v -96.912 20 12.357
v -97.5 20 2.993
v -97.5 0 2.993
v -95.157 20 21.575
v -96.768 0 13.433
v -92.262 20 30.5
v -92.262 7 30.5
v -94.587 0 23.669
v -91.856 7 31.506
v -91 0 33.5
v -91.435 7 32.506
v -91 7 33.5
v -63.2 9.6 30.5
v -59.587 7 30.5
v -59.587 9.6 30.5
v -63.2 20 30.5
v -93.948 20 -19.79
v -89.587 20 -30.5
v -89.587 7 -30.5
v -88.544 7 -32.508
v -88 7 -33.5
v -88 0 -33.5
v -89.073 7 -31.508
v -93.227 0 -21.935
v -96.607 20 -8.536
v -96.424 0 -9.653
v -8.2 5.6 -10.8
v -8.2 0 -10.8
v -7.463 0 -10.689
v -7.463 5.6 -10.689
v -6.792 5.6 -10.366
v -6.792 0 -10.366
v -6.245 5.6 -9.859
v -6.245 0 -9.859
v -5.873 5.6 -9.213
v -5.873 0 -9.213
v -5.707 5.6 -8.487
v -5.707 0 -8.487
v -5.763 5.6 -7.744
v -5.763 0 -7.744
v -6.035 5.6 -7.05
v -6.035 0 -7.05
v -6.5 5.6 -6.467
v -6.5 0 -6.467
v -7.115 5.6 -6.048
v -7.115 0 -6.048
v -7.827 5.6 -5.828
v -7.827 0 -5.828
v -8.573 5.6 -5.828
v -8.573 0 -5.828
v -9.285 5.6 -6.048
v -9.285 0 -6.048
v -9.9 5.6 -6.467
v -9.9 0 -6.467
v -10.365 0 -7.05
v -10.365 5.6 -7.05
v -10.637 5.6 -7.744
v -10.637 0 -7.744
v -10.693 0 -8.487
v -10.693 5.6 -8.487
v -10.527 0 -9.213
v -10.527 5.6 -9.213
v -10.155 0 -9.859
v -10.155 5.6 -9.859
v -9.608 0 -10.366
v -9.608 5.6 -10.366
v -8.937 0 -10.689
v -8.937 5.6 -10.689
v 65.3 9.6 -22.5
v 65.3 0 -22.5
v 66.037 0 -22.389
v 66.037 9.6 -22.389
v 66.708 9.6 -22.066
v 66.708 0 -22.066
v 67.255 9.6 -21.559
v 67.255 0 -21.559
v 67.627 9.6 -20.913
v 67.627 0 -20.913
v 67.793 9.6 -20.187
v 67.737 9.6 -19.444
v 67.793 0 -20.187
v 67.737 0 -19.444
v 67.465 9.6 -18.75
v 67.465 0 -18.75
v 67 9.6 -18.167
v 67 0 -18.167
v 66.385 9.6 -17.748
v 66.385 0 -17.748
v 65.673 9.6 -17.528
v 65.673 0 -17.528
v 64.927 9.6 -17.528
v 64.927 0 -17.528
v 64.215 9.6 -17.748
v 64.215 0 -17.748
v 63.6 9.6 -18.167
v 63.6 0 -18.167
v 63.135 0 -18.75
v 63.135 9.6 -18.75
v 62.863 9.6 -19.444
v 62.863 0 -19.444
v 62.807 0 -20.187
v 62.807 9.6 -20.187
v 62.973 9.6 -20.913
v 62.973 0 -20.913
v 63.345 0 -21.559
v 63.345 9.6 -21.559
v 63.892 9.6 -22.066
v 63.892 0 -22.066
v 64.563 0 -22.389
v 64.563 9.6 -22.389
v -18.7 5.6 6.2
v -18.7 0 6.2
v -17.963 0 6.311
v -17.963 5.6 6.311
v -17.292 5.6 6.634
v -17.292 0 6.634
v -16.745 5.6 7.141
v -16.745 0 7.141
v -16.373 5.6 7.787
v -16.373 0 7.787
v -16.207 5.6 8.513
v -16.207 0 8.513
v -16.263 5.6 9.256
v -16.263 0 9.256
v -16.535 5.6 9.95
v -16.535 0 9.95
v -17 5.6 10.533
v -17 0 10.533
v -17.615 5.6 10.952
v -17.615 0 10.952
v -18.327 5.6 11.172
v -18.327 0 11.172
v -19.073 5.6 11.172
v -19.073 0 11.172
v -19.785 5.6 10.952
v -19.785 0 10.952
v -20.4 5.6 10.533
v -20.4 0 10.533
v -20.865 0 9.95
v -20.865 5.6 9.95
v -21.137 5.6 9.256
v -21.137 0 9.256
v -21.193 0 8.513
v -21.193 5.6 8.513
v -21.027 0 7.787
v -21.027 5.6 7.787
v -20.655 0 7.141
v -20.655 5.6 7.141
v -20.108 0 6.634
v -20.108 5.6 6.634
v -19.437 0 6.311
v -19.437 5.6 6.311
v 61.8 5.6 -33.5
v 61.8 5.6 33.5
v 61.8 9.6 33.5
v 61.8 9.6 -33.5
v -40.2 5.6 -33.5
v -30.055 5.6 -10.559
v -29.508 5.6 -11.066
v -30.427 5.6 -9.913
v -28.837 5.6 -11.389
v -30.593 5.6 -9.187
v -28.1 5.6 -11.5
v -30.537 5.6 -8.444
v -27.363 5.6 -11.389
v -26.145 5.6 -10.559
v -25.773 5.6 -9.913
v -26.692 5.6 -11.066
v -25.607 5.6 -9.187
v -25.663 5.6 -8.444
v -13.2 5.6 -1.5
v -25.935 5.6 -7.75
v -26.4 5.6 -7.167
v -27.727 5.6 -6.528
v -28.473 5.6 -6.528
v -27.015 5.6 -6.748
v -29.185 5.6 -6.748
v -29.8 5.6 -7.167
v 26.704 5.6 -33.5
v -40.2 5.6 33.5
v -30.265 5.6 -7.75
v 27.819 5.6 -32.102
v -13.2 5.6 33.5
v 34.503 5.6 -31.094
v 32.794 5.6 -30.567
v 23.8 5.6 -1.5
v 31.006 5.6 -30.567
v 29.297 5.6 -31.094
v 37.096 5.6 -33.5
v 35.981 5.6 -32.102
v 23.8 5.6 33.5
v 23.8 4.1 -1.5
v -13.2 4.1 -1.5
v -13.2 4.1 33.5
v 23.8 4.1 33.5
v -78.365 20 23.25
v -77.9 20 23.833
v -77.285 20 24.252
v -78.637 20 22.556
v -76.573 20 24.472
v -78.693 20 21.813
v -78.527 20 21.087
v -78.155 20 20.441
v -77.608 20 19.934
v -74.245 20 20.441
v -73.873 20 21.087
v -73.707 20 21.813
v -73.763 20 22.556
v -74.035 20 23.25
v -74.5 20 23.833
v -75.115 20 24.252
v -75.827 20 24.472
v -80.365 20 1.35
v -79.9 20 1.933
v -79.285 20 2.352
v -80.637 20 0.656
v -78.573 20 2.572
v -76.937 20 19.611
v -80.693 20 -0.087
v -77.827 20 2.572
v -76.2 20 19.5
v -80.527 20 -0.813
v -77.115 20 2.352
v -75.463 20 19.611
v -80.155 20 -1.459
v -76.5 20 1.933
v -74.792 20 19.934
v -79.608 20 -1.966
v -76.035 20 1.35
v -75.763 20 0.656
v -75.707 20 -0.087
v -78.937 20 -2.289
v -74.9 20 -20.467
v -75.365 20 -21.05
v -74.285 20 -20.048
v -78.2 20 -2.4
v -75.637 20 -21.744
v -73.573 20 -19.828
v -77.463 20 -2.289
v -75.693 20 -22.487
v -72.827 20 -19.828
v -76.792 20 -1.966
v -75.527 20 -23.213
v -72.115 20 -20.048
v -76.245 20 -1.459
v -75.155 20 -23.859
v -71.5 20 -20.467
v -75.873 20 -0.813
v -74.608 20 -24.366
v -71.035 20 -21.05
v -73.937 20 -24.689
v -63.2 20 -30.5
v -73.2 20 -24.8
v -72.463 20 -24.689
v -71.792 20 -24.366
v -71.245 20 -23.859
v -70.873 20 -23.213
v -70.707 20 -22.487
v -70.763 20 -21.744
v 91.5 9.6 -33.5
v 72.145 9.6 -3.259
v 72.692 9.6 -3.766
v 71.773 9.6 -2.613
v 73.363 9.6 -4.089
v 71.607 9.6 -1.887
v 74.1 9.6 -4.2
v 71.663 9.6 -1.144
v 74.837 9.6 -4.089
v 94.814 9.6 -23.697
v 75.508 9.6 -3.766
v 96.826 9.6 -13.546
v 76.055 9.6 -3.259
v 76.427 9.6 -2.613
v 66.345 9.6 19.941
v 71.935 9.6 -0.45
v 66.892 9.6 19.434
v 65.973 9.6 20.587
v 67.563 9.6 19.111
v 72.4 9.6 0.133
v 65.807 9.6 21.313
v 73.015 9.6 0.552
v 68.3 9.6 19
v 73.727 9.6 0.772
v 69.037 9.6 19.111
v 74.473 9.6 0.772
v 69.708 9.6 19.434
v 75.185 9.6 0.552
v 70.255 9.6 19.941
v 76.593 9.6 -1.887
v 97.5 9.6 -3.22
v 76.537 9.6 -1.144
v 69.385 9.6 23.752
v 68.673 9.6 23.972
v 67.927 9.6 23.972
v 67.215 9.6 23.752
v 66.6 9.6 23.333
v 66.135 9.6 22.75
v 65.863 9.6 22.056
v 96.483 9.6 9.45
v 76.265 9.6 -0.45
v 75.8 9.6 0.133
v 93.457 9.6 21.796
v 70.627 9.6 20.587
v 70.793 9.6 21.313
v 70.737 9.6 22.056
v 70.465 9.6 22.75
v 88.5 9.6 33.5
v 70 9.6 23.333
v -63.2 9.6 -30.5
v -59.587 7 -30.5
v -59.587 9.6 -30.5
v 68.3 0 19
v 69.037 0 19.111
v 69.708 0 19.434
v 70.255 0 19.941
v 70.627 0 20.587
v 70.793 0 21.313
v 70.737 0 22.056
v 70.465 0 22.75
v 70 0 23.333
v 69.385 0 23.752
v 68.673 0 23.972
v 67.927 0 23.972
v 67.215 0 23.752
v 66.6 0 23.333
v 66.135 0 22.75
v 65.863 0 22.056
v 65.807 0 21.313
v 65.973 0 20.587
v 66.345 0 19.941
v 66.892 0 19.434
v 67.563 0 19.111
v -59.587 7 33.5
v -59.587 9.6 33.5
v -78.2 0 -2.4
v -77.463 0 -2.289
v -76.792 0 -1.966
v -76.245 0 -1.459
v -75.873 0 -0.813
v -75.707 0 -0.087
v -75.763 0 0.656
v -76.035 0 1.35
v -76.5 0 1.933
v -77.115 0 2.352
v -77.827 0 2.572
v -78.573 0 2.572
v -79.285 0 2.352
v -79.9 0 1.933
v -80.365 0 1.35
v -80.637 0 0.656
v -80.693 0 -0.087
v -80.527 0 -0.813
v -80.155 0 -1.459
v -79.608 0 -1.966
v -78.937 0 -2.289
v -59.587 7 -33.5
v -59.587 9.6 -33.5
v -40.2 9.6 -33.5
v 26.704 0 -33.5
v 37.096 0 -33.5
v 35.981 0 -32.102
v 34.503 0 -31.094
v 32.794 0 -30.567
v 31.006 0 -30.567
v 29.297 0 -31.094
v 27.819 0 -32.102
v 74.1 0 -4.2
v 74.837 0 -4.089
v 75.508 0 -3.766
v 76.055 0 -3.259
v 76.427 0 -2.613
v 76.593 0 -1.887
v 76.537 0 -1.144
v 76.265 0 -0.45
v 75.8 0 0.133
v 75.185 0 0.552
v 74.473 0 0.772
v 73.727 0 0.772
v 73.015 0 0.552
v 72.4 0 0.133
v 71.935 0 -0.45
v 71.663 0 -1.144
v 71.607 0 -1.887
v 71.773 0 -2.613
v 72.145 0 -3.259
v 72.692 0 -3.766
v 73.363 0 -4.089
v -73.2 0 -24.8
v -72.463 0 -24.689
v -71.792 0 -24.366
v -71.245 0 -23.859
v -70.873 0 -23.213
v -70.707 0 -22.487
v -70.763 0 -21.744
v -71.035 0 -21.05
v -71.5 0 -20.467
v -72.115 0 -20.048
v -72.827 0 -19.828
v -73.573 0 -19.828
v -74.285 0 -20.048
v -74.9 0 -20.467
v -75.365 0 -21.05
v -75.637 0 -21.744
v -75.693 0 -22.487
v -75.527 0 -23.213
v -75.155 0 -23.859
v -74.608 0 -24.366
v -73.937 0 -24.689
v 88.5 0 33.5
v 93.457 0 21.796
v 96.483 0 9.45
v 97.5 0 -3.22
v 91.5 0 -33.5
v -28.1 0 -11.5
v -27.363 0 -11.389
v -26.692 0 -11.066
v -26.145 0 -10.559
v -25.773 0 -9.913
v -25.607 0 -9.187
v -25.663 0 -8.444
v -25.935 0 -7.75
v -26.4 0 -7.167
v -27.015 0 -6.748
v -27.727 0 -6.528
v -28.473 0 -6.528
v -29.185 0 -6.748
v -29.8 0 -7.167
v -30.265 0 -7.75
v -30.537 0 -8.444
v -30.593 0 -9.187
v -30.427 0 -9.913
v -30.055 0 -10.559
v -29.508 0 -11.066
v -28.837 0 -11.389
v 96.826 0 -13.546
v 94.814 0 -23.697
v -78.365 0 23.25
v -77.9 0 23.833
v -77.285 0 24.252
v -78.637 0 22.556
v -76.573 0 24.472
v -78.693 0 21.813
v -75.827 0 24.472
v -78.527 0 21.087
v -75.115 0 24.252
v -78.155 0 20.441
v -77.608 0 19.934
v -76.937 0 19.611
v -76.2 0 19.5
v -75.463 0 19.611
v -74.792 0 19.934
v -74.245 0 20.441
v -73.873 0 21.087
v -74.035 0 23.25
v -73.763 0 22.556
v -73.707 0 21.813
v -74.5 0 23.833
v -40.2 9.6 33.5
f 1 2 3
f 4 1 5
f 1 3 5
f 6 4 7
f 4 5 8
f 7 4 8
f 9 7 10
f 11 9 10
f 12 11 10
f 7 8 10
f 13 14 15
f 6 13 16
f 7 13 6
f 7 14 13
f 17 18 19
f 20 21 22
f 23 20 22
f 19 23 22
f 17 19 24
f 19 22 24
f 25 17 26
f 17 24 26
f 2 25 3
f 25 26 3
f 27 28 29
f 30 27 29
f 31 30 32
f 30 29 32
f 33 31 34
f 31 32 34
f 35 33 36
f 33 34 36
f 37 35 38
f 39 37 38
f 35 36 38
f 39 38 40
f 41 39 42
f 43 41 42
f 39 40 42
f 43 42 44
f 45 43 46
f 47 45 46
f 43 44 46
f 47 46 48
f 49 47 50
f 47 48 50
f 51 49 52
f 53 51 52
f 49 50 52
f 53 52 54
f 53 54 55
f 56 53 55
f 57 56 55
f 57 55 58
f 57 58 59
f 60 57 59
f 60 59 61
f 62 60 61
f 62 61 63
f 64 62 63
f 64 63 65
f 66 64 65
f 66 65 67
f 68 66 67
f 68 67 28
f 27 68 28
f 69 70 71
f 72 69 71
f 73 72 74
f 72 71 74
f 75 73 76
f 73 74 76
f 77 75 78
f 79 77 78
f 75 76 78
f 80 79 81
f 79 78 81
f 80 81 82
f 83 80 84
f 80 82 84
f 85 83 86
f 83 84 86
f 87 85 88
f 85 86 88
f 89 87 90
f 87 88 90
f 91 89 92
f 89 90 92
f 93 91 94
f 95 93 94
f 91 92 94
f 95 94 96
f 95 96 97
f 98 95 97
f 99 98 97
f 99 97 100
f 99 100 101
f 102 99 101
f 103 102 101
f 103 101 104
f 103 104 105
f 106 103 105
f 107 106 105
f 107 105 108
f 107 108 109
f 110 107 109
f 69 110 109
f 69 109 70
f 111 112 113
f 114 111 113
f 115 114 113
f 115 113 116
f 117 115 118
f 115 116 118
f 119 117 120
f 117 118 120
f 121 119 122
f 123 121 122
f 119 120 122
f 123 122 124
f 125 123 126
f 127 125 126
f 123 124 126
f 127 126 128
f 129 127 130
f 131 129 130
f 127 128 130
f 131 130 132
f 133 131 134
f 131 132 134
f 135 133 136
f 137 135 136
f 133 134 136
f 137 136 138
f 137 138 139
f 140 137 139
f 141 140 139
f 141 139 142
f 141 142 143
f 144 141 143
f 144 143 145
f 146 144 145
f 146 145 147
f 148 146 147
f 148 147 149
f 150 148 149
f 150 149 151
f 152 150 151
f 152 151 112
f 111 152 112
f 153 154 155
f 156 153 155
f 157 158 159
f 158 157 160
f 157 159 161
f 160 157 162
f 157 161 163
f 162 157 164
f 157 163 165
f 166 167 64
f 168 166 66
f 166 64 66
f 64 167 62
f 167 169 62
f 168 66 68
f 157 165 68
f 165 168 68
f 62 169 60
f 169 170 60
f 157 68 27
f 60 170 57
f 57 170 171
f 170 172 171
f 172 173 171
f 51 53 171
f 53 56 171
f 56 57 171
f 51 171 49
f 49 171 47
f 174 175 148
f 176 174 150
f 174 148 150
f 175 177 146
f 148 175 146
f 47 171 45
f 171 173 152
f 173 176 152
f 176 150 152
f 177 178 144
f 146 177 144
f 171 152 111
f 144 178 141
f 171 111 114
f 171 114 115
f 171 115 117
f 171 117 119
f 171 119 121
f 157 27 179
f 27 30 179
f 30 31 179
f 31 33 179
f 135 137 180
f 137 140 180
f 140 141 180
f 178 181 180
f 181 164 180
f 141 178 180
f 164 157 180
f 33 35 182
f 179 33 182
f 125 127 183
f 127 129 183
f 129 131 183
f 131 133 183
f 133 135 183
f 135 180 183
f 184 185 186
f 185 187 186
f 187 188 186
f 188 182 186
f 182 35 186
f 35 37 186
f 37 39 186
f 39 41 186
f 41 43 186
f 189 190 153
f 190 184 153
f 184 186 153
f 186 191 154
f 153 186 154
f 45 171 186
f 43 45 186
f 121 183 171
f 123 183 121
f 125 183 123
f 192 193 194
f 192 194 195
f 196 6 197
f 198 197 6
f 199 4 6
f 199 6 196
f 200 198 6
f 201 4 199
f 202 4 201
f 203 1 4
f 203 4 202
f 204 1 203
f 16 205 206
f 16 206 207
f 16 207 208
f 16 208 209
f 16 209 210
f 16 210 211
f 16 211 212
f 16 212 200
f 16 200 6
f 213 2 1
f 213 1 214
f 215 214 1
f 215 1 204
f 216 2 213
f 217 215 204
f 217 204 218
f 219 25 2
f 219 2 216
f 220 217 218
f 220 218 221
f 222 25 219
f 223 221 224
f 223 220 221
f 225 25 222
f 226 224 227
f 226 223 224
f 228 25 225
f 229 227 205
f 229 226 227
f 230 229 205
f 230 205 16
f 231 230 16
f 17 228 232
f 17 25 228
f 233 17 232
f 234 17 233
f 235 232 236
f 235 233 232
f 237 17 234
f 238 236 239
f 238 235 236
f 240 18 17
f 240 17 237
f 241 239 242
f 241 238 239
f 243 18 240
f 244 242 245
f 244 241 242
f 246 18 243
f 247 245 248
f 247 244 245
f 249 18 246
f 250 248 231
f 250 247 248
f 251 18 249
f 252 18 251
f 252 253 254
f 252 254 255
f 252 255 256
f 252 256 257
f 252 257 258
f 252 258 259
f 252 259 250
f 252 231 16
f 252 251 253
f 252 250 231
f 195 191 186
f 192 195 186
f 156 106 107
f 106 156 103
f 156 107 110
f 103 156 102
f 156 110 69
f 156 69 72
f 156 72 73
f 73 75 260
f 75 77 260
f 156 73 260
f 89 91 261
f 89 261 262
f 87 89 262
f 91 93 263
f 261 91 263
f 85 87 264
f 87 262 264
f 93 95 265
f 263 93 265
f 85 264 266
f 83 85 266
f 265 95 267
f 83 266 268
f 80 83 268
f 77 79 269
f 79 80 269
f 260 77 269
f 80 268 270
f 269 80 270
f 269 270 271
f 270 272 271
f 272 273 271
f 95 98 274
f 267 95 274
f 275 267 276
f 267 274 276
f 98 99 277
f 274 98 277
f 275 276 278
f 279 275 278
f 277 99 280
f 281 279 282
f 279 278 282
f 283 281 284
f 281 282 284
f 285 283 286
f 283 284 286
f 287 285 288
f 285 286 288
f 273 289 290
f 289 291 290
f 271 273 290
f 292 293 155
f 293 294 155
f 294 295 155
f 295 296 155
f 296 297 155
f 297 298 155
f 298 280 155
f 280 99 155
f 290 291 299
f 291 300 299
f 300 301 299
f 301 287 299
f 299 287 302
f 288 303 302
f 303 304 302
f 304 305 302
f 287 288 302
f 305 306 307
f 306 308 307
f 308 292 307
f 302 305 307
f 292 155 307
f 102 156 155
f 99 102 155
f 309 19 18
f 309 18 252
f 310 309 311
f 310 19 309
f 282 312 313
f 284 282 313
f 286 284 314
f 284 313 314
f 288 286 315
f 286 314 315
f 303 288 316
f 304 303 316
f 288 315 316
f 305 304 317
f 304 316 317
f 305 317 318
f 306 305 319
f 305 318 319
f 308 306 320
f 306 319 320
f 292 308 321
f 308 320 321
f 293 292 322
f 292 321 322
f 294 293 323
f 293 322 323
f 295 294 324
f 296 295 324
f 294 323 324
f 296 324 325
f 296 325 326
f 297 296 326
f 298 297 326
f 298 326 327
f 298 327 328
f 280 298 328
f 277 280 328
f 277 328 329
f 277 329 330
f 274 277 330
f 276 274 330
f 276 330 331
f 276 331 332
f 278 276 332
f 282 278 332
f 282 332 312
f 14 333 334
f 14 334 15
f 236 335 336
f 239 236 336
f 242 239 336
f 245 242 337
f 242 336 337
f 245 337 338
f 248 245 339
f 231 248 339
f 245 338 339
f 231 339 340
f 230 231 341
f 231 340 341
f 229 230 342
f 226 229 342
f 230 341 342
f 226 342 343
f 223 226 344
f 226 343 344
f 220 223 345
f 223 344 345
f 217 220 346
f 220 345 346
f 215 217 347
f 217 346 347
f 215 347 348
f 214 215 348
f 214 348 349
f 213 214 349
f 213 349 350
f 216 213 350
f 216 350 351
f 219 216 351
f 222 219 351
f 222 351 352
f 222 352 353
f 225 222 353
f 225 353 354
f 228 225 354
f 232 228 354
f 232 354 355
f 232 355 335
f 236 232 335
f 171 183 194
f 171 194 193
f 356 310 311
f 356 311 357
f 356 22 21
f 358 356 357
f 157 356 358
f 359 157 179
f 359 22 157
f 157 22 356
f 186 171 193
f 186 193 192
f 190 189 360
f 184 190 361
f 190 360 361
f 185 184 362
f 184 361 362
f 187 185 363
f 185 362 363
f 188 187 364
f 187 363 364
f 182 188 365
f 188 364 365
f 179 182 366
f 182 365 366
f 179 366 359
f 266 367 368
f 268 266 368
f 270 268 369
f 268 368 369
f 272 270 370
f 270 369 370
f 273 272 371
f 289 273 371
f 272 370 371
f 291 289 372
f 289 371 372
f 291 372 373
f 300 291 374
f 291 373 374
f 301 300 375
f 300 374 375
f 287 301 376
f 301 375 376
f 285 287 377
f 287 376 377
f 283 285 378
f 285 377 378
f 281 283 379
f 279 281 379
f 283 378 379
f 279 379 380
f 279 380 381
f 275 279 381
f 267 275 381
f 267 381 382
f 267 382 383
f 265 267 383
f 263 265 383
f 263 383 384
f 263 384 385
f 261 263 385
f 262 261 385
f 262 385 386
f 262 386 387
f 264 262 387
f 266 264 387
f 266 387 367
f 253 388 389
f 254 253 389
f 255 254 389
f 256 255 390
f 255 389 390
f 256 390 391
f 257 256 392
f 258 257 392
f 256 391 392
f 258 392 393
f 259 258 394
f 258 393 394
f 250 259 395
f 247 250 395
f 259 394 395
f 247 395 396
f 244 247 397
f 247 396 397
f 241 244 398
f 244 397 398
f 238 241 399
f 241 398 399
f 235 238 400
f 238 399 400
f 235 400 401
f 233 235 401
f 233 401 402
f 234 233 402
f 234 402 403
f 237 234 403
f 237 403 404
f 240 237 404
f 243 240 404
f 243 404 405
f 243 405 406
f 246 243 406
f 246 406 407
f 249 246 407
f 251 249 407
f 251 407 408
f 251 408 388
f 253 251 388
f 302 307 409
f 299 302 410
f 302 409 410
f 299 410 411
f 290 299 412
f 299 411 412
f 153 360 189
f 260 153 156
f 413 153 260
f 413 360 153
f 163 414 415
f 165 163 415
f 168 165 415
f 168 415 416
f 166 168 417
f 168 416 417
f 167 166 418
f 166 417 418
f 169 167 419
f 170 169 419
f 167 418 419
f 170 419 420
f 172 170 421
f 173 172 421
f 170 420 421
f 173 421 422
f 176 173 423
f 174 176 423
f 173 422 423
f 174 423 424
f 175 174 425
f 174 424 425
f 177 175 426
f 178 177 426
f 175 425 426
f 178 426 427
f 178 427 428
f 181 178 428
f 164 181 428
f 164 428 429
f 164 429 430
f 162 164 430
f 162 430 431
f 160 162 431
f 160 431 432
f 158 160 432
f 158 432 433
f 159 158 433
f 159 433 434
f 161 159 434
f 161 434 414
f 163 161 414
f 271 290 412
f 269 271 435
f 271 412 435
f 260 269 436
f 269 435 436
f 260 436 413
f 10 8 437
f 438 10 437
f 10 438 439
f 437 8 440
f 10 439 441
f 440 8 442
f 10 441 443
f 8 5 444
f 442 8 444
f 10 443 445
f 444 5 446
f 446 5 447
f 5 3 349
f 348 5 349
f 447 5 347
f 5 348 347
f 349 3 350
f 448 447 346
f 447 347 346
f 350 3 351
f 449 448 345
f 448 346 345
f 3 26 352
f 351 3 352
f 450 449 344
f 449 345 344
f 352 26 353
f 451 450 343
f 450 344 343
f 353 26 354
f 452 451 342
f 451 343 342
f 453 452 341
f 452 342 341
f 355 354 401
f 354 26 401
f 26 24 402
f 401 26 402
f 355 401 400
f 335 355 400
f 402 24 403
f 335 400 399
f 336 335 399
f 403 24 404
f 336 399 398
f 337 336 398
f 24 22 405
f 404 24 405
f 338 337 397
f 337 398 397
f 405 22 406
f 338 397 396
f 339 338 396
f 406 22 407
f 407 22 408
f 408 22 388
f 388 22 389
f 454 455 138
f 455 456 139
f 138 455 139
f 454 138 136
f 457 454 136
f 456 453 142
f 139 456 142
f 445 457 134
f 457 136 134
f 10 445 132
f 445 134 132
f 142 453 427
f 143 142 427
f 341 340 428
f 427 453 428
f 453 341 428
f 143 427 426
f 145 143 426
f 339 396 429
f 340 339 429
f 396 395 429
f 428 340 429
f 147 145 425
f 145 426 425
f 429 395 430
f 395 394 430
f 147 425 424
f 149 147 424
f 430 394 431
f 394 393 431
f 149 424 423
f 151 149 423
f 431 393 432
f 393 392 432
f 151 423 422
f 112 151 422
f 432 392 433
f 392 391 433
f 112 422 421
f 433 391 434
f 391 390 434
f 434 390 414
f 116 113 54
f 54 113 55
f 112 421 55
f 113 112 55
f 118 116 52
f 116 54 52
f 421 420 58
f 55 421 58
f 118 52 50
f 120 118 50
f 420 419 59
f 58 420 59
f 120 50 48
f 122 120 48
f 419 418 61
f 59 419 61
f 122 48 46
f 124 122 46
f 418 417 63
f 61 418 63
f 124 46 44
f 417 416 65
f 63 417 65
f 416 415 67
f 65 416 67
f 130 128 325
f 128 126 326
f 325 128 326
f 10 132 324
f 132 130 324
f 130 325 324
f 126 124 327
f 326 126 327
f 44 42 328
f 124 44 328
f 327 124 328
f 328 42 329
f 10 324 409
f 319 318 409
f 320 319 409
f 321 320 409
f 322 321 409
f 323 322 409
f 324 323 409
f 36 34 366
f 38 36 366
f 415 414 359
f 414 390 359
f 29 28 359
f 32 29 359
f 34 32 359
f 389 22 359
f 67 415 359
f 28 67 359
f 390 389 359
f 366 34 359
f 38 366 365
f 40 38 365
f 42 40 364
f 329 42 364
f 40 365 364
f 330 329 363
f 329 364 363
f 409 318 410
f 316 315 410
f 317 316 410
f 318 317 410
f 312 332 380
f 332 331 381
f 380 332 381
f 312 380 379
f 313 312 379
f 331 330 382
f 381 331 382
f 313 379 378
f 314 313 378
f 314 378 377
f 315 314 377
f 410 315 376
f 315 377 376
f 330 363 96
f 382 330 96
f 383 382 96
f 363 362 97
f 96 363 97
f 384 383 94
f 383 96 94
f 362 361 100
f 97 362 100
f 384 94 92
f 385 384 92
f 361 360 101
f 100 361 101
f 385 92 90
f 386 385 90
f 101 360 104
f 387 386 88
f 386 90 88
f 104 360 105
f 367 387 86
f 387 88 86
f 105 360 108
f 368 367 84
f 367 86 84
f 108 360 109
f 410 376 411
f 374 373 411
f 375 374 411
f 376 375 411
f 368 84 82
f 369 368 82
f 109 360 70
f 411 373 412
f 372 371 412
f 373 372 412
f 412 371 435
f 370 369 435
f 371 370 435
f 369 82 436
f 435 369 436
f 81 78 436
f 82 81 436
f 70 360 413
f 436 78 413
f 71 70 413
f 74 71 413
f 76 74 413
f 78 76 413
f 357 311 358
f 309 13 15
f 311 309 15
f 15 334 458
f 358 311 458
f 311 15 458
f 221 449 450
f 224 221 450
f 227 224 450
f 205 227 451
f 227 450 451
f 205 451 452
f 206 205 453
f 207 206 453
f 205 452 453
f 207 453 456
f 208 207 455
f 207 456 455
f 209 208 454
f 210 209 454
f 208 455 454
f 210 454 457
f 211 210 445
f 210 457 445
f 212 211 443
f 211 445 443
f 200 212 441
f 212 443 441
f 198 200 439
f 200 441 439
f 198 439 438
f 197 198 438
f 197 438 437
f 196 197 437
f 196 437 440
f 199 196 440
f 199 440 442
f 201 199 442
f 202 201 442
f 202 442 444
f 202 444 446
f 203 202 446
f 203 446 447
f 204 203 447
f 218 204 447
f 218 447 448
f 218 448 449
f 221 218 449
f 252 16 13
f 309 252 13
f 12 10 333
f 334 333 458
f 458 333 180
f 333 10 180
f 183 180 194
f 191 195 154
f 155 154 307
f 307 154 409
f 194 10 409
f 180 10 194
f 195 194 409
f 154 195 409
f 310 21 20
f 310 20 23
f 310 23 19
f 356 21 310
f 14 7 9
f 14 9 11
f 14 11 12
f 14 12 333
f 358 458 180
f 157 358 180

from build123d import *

# Parameters (mm, degrees)
SKETCH1_W           = 195
SKETCH1_H           = 67
BOSS_EXTRUDE1_DEPTH = 20
SKETCH2_R           = 6
CUT_EXTRUDE1_DEPTH  = 20
CUT_EXTRUDE2_DEPTH  = 120.980206701
CUT_EXTRUDE3_START  = -13
SKETCH4_W           = 3.612655346
SKETCH4_H           = 3
CUT_EXTRUDE3_DEPTH  = 13
SKETCH6_R           = 2.5
CUT_EXTRUDE4_DEPTH  = 106.016665344
SKETCH7_W           = 37
SKETCH7_H           = 35
CUT_EXTRUDE5_DEPTH  = 1.5


with BuildPart() as part:
    # Sketch1 → Boss-Extrude1 (new body)
    with BuildSketch(Plane(origin=(0, 0, 0), x_dir=(1, 0, 0), z_dir=(0, 1, 0))):
        Rectangle(SKETCH1_W, SKETCH1_H)
    extrude(amount=BOSS_EXTRUDE1_DEPTH)

    # Sketch2 → Cut-Extrude1 (cut)
    with BuildSketch(Plane.XZ):
        with BuildLine():
            Line((97.5, -3.219751644), (97.5, 33.5))
            Line((97.5, 33.5), (88.5, 33.5))
            ThreePointArc((88.5, 33.5), (95.217186872, 15.683556008), (97.5, -3.219751644))
        make_face()
        with BuildLine():
            Line((97.5, -33.5), (97.5, -3.219751644))
            ThreePointArc((97.5, -3.219751644), (95.985558513, -18.65423771), (91.5, -33.5))
            Line((91.5, -33.5), (97.5, -33.5))
        make_face()
        with BuildLine():
            ThreePointArc((-88, -33.5), (-95.08607052, -15.861694529), (-97.5, 2.992884749))
            Line((-97.5, 2.992884749), (-97.5, -33.5))
            Line((-97.5, -33.5), (-88, -33.5))
        make_face()
        with BuildLine():
            ThreePointArc((-97.5, 2.992884749), (-95.856964648, 18.588830376), (-91, 33.5))
            Line((-91, 33.5), (-97.5, 33.5))
            Line((-97.5, 33.5), (-97.5, 2.992884749))
        make_face()
        with Locations((31.9, -36.5)):
            Circle(SKETCH2_R)
    extrude(amount=-CUT_EXTRUDE1_DEPTH, mode=Mode.SUBTRACT)

    # Sketch3 → Cut-Extrude2 (cut, through all)
    with BuildSketch(Plane(origin=(0, 0, 33.5), x_dir=(-1, 0, 0), z_dir=(0, 0, -1))):
        Polygon((63.2, 20), (63.2, 9.6), (40.2, 9.6), (40.2, 5.6), (-61.8, 5.6), (-61.8, 9.6), (-97.5, 9.6), (-97.5, 20), align=None)
    extrude(amount=CUT_EXTRUDE2_DEPTH, mode=Mode.SUBTRACT)

    # Sketch4 → Cut-Extrude3 (cut)
    with BuildSketch(Plane(origin=(0, 20, 0), x_dir=(1, 0, 0), z_dir=(0, 1, 0)).offset(CUT_EXTRUDE3_START)):
        with BuildLine():
            Line((-63.2, 30.5), (-63.2, 33.5))
            Line((-63.2, 33.5), (-88, 33.5))
            ThreePointArc((-88, 33.5), (-88.810680862, 32.008999469), (-89.587344654, 30.5))
            Line((-89.587344654, 30.5), (-63.2, 30.5))
        make_face()
        with Locations((-61.393672327, 32)):
            Rectangle(SKETCH4_W, SKETCH4_H)
        with BuildLine():
            Line((-63.2, -33.5), (-63.2, -30.5))
            Line((-63.2, -30.5), (-92.261692194, -30.5))
            ThreePointArc((-92.261692194, -30.5), (-91.647155152, -32.006859002), (-91, -33.5))
            Line((-91, -33.5), (-63.2, -33.5))
        make_face()
        with Locations((-61.393672327, -32)):
            Rectangle(SKETCH4_W, SKETCH4_H)
    extrude(amount=CUT_EXTRUDE3_DEPTH, mode=Mode.SUBTRACT)

    # Sketch6 → Cut-Extrude4 (cut, through all)
    with BuildSketch(Plane.XZ):
        with Locations(Location((-28.1, -9, 0), (0, 0, 270))):
            Circle(SKETCH6_R)
        with Locations(Location((-8.2, -8.3, 0), (0, 0, 270))):
            Circle(SKETCH6_R)
        with Locations(Location((-18.7, 8.7, 0), (0, 0, 270))):
            Circle(SKETCH6_R)
        with Locations(Location((-76.2, 22, 0), (0, 0, 270))):
            Circle(SKETCH6_R)
        with Locations(Location((-78.2, 0.1, 0), (0, 0, 270))):
            Circle(SKETCH6_R)
        with Locations(Location((-73.2, -22.3, 0), (0, 0, 270))):
            Circle(SKETCH6_R)
        with Locations(Location((65.3, -20, 0), (0, 0, 270))):
            Circle(SKETCH6_R)
        with Locations(Location((74.1, -1.7, 0), (0, 0, 270))):
            Circle(SKETCH6_R)
        with Locations(Location((68.3, 21.5, 0), (0, 0, 270))):
            Circle(SKETCH6_R)
    extrude(amount=-CUT_EXTRUDE4_DEPTH, mode=Mode.SUBTRACT)

    # Sketch7 → Cut-Extrude5 (cut)
    with BuildSketch(Plane(origin=(0, 5.6, 0), x_dir=(1, 0, 0), z_dir=(0, 1, 0))):
        with Locations((5.3, -16)):
            Rectangle(SKETCH7_W, SKETCH7_H)
    extrude(amount=-CUT_EXTRUDE5_DEPTH, mode=Mode.SUBTRACT)


solid = part.part
